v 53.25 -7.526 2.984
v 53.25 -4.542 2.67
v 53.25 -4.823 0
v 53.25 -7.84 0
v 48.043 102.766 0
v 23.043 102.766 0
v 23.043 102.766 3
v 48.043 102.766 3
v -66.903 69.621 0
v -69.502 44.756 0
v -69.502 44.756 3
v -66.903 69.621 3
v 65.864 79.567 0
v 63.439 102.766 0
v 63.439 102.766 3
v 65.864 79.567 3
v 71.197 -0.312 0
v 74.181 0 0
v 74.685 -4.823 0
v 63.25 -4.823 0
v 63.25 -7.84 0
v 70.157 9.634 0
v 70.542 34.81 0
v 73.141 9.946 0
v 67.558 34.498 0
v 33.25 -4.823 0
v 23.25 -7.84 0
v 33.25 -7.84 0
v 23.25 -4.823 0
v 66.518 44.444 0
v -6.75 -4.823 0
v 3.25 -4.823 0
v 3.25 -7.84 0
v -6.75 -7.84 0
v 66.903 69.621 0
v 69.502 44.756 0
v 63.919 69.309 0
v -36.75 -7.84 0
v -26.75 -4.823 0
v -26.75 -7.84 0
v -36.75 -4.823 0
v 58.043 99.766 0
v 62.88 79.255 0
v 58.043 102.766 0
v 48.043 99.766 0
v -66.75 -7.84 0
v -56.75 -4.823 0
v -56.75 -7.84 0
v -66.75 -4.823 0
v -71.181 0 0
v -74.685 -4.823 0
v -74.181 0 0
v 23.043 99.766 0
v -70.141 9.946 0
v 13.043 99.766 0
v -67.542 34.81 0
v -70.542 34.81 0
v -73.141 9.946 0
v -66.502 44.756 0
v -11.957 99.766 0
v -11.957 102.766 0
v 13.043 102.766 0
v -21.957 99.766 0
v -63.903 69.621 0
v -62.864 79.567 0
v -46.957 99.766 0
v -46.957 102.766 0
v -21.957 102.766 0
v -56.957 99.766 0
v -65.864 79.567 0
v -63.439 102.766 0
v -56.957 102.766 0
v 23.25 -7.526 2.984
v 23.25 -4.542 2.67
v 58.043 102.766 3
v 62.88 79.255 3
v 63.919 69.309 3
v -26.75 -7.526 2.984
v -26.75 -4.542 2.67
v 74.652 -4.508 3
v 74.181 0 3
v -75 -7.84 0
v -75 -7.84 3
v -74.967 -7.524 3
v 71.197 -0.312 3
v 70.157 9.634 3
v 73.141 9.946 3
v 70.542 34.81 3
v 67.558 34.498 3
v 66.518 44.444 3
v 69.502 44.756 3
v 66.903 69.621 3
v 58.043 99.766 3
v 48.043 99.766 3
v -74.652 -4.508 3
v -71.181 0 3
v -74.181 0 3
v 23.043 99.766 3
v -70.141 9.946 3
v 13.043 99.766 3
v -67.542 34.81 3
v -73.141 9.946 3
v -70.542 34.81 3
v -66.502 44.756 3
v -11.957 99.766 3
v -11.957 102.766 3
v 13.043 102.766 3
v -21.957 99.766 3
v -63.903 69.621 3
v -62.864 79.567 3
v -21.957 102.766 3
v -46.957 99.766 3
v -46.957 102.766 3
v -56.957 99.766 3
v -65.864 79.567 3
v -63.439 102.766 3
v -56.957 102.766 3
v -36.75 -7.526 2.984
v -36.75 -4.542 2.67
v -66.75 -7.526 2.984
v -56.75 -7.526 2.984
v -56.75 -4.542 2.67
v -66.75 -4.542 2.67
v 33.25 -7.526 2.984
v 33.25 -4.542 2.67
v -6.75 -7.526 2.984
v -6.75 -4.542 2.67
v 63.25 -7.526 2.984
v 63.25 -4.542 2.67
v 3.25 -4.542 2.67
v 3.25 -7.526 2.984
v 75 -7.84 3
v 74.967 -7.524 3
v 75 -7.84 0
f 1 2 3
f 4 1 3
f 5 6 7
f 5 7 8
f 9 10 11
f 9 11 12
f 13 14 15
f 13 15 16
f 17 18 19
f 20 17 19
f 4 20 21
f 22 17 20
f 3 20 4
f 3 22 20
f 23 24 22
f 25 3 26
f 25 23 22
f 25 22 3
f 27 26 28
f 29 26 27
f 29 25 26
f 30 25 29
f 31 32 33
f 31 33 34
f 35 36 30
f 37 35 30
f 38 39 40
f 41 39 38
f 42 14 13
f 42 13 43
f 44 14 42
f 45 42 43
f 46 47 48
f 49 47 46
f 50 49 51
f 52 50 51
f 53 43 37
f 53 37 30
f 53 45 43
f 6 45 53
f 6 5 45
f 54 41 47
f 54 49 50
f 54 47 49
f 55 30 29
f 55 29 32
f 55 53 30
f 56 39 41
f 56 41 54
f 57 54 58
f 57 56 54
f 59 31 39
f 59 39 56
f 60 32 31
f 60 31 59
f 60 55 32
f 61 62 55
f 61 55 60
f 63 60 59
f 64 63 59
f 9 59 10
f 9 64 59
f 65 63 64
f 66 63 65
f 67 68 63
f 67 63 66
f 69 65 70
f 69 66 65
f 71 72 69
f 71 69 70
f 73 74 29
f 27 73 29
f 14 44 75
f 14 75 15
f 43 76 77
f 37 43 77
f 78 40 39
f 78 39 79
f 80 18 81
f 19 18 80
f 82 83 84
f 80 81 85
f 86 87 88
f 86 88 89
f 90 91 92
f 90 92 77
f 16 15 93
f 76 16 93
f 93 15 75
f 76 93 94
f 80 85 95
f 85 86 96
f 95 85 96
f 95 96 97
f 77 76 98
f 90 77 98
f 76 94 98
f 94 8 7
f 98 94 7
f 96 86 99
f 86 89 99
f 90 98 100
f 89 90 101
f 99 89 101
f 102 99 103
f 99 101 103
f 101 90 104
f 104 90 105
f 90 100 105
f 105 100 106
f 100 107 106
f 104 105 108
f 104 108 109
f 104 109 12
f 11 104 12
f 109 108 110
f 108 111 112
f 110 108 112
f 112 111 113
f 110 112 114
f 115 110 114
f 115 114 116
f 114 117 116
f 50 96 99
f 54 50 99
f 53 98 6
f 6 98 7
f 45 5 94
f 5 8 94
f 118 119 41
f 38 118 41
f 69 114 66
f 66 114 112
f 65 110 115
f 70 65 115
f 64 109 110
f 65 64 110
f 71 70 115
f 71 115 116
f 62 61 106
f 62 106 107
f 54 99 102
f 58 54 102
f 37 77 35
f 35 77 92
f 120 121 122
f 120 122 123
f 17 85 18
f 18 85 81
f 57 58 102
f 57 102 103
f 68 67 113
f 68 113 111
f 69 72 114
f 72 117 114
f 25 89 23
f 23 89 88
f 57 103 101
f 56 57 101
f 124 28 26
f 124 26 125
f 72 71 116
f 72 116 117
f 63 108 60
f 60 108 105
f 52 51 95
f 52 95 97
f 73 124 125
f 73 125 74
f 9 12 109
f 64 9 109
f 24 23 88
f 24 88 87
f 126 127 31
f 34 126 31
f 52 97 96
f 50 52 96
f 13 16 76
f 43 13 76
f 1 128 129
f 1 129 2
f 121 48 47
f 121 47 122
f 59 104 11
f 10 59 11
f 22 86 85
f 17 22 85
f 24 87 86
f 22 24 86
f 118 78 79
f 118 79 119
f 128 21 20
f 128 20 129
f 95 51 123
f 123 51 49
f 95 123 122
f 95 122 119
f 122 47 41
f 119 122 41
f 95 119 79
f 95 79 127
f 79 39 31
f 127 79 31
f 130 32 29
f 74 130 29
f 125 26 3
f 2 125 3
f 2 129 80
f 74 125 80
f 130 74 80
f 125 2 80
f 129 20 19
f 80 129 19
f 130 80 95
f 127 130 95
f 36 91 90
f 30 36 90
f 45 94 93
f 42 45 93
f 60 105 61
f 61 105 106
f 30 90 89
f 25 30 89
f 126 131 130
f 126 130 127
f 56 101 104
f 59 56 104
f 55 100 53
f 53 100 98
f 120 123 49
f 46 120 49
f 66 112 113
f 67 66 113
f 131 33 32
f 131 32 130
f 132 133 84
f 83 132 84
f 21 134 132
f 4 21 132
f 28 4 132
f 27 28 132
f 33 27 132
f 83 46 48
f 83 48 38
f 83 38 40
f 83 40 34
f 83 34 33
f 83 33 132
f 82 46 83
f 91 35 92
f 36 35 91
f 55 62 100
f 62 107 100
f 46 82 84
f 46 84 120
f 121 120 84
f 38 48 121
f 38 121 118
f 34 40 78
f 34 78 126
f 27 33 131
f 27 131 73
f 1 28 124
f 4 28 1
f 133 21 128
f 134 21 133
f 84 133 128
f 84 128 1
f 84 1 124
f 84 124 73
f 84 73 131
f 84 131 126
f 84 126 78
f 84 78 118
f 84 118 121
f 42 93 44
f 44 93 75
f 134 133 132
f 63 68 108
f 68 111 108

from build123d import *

# Parameters (mm, degrees)
BOSS_EXTRUDE1_DEPTH = 3
CUT_EXTRUDE1_DEPTH  = 128.25921375
LPATTERN1_COUNT     = 4
LPATTERN1_PITCH     = 35
CUT_EXTRUDE3_DEPTH  = 3
LPATTERN2_COUNT     = 3
LPATTERN2_PITCH     = 35
CUT_EXTRUDE4_DEPTH  = 3
LPATTERN3_COUNT     = 3
LPATTERN3_PITCH     = 35
CAVITY1_START       = -7.796688406
CAVITY1_DEPTH       = 3


# Read off the part's stored shape, not the designer's step: Cavity1
with BuildPart() as part:
    # Sketch1 → Boss-Extrude1 (new body)
    with BuildSketch(Plane.XY):
        Polygon((-63.438534121, 102.766276007), (63.438534121, 102.766276007), (75, -7.839634745), (-75, -7.839634745), align=None)
    extrude(amount=BOSS_EXTRUDE1_DEPTH)

    # Sketch2 → Cut-Extrude1 (cut, symmetric)
    with BuildSketch(Plane.XY):
        Polygon((-56.956577019, 457.127747207), (-56.956577019, 102.766276007), (-56.956577019, 99.766276007), (-46.956577019, 99.766276007), (-46.956577019, 102.766276007), (-46.956577019, 457.127747207), (-46.956577019, 1165.850689606), (-56.956577019, 1165.850689606), align=None)
    cut_extrude1 = extrude(amount=CUT_EXTRUDE1_DEPTH, both=True, mode=Mode.SUBTRACT)

    # LPattern1: Cut-Extrude1 ×4
    with Locations(*[(i * LPATTERN1_PITCH, 0, 0) for i in range(1, LPATTERN1_COUNT)]):
        add(cut_extrude1, mode=Mode.SUBTRACT)

    # Sketch3 → Cut-Extrude3 (cut)
    with BuildSketch(Plane.XY.offset(3)):
        Polygon((-74.180535028, 0), (-71.180535028, 0), (-70.140914516, 9.945812646), (-73.140914516, 9.945812646), align=None)
    cut_extrude3 = extrude(amount=-CUT_EXTRUDE3_DEPTH, mode=Mode.SUBTRACT)

    # LPattern2: Cut-Extrude3 ×3
    with Locations(*[Vector(0.10396205118449778, 0.9945812646101434, 0) * (i * LPATTERN2_PITCH) for i in range(1, LPATTERN2_COUNT)]):
        add(cut_extrude3, mode=Mode.SUBTRACT)

    # Sketch7 → Cut-Extrude4 (cut)
    with BuildSketch(Plane.XY.offset(3)):
        Polygon((74.180535028, 0), (73.140914516, 9.945812646), (70.157170722, 9.633926493), (71.196791234, -0.311886154), align=None)
    cut_extrude4 = extrude(amount=-CUT_EXTRUDE4_DEPTH, mode=Mode.SUBTRACT)

    # LPattern3: Cut-Extrude4 ×3
    with Locations(*[Vector(-0.10396205118449776, 0.9945812646101434, 0) * (i * LPATTERN3_PITCH) for i in range(1, LPATTERN3_COUNT)]):
        add(cut_extrude4, mode=Mode.SUBTRACT)

    # Cavity1 outline → Cavity1 (cut)
    with BuildSketch(Plane(origin=(0, 0, 0), x_dir=(1, 0, 0), z_dir=(0, 0.9945218953682734, -0.10452846326765304)).offset(CAVITY1_START)):
        Polygon((-56.749963879, 2), (-56.749963879, -2.180535028), (-66.749963879, -2.180535028), (-66.749963879, 2), (-77, 2), (-77, -4), (77, -4), (77, 2), (63.250036121, 2), (63.250036121, -2.180535028), (53.250036121, -2.180535028), (53.250036121, 2), (33.250036121, 2), (33.250036121, -2.180535028), (23.250036121, -2.180535028), (23.250036121, 2), (3.250036121, 2), (3.250036121, -2.180535028), (-6.749963879, -2.180535028), (-6.749963879, 2), (-26.749963879, 2), (-26.749963879, -2.180535028), (-36.749963879, -2.180535028), (-36.749963879, 2), align=None)
    extrude(amount=CAVITY1_DEPTH, mode=Mode.SUBTRACT)


solid = part.part
